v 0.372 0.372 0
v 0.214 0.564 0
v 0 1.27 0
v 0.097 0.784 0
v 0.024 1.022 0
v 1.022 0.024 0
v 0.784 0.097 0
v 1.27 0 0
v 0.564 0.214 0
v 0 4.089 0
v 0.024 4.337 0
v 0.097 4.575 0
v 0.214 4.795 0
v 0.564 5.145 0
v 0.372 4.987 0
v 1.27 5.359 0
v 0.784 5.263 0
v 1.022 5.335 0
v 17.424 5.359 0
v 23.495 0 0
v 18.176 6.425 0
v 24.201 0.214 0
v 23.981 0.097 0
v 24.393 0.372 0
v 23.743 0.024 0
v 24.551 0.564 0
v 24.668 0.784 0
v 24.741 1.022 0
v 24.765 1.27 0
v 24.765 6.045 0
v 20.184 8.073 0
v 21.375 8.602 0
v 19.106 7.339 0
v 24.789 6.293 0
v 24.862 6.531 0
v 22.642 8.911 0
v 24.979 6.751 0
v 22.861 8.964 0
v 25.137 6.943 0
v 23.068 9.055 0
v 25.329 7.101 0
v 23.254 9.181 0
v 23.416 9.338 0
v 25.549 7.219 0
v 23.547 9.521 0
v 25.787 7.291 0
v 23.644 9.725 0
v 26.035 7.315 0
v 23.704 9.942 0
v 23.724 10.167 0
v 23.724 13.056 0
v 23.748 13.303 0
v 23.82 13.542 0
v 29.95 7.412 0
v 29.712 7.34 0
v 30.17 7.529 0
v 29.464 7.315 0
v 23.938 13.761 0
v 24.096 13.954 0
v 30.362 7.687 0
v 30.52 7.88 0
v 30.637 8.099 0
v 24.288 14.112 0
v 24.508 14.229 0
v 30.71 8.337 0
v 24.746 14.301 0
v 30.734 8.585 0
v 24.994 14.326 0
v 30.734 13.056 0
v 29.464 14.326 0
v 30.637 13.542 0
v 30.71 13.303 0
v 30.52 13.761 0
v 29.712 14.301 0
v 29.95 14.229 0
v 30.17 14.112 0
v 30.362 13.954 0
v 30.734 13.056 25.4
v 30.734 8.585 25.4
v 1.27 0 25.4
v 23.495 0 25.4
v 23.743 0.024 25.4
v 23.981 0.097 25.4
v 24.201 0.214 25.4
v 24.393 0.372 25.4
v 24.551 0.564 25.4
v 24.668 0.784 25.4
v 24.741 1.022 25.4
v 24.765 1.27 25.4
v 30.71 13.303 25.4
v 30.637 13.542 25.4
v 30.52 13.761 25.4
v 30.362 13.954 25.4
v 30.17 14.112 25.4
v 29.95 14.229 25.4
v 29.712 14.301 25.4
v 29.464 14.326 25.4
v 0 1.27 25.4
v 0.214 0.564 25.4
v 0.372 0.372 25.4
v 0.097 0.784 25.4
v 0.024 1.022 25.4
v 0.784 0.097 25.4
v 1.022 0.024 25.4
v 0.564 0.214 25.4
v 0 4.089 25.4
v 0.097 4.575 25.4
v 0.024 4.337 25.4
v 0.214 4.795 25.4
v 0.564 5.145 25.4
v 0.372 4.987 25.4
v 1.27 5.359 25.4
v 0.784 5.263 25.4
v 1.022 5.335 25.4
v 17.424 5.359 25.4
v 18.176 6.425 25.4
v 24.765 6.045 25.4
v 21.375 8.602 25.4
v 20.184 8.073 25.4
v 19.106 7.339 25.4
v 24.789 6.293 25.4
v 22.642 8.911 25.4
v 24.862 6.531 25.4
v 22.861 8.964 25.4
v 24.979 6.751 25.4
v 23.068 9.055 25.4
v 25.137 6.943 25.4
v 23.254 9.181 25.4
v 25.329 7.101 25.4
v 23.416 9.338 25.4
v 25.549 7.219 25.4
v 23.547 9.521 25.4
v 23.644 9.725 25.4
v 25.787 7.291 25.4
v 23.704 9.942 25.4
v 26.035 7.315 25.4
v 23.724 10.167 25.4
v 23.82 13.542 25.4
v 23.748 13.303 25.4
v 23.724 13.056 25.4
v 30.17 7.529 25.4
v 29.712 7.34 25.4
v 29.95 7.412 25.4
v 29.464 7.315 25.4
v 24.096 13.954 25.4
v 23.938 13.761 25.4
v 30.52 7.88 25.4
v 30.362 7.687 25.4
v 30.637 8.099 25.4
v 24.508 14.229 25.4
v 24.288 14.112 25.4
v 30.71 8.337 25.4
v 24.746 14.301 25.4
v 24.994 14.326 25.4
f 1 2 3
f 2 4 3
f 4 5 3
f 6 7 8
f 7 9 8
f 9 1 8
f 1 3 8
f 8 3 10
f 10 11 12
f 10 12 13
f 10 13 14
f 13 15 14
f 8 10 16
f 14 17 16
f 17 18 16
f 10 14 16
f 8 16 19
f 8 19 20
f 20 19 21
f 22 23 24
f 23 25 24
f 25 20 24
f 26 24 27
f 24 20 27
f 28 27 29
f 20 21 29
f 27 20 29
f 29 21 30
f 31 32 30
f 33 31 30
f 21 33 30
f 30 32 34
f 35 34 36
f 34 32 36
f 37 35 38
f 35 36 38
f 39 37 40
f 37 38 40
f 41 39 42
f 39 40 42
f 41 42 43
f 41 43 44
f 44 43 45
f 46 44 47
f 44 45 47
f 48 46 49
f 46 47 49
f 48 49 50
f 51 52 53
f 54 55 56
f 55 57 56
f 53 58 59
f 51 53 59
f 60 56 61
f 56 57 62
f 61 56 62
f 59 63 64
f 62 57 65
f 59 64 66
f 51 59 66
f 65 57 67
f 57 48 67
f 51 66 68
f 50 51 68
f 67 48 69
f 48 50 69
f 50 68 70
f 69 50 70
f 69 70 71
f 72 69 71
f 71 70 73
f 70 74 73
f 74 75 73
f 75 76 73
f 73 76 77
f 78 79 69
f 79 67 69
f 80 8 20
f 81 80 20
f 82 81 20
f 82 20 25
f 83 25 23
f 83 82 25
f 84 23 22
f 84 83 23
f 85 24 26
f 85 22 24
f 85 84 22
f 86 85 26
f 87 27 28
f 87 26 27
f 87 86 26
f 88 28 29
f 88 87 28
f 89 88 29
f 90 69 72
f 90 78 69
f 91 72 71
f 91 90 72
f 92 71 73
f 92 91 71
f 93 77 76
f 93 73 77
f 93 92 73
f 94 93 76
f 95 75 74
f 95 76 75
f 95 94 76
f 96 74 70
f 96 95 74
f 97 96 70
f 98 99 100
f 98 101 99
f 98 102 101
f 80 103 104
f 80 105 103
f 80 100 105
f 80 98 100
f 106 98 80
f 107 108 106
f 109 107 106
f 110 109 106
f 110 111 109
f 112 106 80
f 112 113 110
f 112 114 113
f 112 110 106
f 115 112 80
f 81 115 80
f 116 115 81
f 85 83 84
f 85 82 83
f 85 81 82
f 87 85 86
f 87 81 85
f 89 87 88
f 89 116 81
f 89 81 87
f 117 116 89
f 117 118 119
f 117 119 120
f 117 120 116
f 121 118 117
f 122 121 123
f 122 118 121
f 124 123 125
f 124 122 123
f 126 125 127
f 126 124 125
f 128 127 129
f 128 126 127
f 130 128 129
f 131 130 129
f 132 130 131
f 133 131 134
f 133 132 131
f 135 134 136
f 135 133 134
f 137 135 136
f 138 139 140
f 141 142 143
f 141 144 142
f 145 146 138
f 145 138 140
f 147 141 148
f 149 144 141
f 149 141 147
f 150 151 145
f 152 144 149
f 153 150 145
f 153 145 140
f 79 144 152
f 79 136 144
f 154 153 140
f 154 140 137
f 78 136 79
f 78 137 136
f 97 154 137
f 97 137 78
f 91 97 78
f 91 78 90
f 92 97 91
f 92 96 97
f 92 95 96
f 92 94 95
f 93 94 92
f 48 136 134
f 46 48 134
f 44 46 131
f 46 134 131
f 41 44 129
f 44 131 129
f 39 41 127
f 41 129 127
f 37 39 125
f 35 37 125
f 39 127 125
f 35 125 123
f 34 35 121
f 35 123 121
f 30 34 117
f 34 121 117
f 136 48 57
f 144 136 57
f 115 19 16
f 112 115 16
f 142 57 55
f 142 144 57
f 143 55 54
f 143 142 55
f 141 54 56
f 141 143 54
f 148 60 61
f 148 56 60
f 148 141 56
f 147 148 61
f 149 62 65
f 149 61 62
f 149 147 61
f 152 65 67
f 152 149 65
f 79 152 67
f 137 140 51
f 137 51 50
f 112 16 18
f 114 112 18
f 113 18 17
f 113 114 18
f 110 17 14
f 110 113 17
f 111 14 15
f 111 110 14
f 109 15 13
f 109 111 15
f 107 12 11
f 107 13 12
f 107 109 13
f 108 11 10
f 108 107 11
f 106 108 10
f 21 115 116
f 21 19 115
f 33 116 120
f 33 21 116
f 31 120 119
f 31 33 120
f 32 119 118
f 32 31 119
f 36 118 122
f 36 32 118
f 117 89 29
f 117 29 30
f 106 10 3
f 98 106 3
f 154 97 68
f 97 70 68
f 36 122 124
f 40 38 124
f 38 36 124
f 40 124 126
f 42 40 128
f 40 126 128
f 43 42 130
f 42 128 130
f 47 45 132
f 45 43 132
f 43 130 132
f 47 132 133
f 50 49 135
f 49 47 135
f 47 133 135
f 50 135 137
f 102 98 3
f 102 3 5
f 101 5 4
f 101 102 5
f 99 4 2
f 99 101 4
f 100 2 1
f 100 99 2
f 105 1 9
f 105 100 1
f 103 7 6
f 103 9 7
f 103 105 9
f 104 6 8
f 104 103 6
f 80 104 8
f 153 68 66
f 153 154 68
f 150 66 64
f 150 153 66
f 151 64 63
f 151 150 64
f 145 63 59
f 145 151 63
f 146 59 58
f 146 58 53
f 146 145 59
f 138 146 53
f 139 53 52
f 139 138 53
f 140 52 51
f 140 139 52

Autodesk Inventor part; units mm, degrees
ref_plane "YZ Plane" through (0, 0, 0) normal (1, 0, 0) x (0, 1, 0)
ref_plane "XZ Plane" through (0, 0, 0) normal (0, 1, 0) x (-1, 0, 0)
ref_plane "XY Plane" through (0, 0, 0) normal (0, 0, 1) x (1, 0, 0)
sketch "Sketch1" plane through (0, 0, 0) normal (0, 0, 1) x (1, 0, 0)
  line L0 (0, 0) -> (24.765, 0)
  line L1 (24.765, 0) -> (24.765, 5.3594)
  line L2 (24.765, 5.3594) -> (0, 5.3594)
  line L3 (0, 5.3594) -> (0, 0)
  line L4 (23.7236, 7.3152) -> (30.734, 7.3152)
  line L5 (30.734, 7.3152) -> (30.734, 14.3256)
  line L6 (30.734, 14.3256) -> (23.7236, 14.3256)
  line L7 (23.7236, 14.3256) -> (23.7236, 7.3152)
  arc A0 (23.7236, 8.9916) -> (17.4244, 5.3594) centre (23.7236, 1.7133) ccw
  line L8 (24.765, 5.3594) -> (24.765, 7.3152)
  dimension "d0" = 24.765
  dimension "d1" = 5.3594
  dimension "d2" = 30.734
  dimension "d3" = 7.0104
  dimension "d4" = 14.3256
  dimension "d5" = 17.4244
  dimension "d6" = 5.334
extrude "Extrusion1" add sketch "Sketch1" along normal blind 25.4
fillet "Fillet1" radius 1.27 1 edges at (30.734, 14.3256, 12.7)
fillet "Fillet2" radius 1.27 2 edges at (30.734, 7.3152, 12.7) (23.7236, 14.3256, 12.7)
fillet "Fillet3" radius 1.27 5 edges at (23.7236, 8.9916, 12.7) (24.765, 7.3152, 12.7) (24.765, 0, 12.7) (0, 0, 12.7) (0, 5.3594, 12.7)
properties part number "Igus Slider"
